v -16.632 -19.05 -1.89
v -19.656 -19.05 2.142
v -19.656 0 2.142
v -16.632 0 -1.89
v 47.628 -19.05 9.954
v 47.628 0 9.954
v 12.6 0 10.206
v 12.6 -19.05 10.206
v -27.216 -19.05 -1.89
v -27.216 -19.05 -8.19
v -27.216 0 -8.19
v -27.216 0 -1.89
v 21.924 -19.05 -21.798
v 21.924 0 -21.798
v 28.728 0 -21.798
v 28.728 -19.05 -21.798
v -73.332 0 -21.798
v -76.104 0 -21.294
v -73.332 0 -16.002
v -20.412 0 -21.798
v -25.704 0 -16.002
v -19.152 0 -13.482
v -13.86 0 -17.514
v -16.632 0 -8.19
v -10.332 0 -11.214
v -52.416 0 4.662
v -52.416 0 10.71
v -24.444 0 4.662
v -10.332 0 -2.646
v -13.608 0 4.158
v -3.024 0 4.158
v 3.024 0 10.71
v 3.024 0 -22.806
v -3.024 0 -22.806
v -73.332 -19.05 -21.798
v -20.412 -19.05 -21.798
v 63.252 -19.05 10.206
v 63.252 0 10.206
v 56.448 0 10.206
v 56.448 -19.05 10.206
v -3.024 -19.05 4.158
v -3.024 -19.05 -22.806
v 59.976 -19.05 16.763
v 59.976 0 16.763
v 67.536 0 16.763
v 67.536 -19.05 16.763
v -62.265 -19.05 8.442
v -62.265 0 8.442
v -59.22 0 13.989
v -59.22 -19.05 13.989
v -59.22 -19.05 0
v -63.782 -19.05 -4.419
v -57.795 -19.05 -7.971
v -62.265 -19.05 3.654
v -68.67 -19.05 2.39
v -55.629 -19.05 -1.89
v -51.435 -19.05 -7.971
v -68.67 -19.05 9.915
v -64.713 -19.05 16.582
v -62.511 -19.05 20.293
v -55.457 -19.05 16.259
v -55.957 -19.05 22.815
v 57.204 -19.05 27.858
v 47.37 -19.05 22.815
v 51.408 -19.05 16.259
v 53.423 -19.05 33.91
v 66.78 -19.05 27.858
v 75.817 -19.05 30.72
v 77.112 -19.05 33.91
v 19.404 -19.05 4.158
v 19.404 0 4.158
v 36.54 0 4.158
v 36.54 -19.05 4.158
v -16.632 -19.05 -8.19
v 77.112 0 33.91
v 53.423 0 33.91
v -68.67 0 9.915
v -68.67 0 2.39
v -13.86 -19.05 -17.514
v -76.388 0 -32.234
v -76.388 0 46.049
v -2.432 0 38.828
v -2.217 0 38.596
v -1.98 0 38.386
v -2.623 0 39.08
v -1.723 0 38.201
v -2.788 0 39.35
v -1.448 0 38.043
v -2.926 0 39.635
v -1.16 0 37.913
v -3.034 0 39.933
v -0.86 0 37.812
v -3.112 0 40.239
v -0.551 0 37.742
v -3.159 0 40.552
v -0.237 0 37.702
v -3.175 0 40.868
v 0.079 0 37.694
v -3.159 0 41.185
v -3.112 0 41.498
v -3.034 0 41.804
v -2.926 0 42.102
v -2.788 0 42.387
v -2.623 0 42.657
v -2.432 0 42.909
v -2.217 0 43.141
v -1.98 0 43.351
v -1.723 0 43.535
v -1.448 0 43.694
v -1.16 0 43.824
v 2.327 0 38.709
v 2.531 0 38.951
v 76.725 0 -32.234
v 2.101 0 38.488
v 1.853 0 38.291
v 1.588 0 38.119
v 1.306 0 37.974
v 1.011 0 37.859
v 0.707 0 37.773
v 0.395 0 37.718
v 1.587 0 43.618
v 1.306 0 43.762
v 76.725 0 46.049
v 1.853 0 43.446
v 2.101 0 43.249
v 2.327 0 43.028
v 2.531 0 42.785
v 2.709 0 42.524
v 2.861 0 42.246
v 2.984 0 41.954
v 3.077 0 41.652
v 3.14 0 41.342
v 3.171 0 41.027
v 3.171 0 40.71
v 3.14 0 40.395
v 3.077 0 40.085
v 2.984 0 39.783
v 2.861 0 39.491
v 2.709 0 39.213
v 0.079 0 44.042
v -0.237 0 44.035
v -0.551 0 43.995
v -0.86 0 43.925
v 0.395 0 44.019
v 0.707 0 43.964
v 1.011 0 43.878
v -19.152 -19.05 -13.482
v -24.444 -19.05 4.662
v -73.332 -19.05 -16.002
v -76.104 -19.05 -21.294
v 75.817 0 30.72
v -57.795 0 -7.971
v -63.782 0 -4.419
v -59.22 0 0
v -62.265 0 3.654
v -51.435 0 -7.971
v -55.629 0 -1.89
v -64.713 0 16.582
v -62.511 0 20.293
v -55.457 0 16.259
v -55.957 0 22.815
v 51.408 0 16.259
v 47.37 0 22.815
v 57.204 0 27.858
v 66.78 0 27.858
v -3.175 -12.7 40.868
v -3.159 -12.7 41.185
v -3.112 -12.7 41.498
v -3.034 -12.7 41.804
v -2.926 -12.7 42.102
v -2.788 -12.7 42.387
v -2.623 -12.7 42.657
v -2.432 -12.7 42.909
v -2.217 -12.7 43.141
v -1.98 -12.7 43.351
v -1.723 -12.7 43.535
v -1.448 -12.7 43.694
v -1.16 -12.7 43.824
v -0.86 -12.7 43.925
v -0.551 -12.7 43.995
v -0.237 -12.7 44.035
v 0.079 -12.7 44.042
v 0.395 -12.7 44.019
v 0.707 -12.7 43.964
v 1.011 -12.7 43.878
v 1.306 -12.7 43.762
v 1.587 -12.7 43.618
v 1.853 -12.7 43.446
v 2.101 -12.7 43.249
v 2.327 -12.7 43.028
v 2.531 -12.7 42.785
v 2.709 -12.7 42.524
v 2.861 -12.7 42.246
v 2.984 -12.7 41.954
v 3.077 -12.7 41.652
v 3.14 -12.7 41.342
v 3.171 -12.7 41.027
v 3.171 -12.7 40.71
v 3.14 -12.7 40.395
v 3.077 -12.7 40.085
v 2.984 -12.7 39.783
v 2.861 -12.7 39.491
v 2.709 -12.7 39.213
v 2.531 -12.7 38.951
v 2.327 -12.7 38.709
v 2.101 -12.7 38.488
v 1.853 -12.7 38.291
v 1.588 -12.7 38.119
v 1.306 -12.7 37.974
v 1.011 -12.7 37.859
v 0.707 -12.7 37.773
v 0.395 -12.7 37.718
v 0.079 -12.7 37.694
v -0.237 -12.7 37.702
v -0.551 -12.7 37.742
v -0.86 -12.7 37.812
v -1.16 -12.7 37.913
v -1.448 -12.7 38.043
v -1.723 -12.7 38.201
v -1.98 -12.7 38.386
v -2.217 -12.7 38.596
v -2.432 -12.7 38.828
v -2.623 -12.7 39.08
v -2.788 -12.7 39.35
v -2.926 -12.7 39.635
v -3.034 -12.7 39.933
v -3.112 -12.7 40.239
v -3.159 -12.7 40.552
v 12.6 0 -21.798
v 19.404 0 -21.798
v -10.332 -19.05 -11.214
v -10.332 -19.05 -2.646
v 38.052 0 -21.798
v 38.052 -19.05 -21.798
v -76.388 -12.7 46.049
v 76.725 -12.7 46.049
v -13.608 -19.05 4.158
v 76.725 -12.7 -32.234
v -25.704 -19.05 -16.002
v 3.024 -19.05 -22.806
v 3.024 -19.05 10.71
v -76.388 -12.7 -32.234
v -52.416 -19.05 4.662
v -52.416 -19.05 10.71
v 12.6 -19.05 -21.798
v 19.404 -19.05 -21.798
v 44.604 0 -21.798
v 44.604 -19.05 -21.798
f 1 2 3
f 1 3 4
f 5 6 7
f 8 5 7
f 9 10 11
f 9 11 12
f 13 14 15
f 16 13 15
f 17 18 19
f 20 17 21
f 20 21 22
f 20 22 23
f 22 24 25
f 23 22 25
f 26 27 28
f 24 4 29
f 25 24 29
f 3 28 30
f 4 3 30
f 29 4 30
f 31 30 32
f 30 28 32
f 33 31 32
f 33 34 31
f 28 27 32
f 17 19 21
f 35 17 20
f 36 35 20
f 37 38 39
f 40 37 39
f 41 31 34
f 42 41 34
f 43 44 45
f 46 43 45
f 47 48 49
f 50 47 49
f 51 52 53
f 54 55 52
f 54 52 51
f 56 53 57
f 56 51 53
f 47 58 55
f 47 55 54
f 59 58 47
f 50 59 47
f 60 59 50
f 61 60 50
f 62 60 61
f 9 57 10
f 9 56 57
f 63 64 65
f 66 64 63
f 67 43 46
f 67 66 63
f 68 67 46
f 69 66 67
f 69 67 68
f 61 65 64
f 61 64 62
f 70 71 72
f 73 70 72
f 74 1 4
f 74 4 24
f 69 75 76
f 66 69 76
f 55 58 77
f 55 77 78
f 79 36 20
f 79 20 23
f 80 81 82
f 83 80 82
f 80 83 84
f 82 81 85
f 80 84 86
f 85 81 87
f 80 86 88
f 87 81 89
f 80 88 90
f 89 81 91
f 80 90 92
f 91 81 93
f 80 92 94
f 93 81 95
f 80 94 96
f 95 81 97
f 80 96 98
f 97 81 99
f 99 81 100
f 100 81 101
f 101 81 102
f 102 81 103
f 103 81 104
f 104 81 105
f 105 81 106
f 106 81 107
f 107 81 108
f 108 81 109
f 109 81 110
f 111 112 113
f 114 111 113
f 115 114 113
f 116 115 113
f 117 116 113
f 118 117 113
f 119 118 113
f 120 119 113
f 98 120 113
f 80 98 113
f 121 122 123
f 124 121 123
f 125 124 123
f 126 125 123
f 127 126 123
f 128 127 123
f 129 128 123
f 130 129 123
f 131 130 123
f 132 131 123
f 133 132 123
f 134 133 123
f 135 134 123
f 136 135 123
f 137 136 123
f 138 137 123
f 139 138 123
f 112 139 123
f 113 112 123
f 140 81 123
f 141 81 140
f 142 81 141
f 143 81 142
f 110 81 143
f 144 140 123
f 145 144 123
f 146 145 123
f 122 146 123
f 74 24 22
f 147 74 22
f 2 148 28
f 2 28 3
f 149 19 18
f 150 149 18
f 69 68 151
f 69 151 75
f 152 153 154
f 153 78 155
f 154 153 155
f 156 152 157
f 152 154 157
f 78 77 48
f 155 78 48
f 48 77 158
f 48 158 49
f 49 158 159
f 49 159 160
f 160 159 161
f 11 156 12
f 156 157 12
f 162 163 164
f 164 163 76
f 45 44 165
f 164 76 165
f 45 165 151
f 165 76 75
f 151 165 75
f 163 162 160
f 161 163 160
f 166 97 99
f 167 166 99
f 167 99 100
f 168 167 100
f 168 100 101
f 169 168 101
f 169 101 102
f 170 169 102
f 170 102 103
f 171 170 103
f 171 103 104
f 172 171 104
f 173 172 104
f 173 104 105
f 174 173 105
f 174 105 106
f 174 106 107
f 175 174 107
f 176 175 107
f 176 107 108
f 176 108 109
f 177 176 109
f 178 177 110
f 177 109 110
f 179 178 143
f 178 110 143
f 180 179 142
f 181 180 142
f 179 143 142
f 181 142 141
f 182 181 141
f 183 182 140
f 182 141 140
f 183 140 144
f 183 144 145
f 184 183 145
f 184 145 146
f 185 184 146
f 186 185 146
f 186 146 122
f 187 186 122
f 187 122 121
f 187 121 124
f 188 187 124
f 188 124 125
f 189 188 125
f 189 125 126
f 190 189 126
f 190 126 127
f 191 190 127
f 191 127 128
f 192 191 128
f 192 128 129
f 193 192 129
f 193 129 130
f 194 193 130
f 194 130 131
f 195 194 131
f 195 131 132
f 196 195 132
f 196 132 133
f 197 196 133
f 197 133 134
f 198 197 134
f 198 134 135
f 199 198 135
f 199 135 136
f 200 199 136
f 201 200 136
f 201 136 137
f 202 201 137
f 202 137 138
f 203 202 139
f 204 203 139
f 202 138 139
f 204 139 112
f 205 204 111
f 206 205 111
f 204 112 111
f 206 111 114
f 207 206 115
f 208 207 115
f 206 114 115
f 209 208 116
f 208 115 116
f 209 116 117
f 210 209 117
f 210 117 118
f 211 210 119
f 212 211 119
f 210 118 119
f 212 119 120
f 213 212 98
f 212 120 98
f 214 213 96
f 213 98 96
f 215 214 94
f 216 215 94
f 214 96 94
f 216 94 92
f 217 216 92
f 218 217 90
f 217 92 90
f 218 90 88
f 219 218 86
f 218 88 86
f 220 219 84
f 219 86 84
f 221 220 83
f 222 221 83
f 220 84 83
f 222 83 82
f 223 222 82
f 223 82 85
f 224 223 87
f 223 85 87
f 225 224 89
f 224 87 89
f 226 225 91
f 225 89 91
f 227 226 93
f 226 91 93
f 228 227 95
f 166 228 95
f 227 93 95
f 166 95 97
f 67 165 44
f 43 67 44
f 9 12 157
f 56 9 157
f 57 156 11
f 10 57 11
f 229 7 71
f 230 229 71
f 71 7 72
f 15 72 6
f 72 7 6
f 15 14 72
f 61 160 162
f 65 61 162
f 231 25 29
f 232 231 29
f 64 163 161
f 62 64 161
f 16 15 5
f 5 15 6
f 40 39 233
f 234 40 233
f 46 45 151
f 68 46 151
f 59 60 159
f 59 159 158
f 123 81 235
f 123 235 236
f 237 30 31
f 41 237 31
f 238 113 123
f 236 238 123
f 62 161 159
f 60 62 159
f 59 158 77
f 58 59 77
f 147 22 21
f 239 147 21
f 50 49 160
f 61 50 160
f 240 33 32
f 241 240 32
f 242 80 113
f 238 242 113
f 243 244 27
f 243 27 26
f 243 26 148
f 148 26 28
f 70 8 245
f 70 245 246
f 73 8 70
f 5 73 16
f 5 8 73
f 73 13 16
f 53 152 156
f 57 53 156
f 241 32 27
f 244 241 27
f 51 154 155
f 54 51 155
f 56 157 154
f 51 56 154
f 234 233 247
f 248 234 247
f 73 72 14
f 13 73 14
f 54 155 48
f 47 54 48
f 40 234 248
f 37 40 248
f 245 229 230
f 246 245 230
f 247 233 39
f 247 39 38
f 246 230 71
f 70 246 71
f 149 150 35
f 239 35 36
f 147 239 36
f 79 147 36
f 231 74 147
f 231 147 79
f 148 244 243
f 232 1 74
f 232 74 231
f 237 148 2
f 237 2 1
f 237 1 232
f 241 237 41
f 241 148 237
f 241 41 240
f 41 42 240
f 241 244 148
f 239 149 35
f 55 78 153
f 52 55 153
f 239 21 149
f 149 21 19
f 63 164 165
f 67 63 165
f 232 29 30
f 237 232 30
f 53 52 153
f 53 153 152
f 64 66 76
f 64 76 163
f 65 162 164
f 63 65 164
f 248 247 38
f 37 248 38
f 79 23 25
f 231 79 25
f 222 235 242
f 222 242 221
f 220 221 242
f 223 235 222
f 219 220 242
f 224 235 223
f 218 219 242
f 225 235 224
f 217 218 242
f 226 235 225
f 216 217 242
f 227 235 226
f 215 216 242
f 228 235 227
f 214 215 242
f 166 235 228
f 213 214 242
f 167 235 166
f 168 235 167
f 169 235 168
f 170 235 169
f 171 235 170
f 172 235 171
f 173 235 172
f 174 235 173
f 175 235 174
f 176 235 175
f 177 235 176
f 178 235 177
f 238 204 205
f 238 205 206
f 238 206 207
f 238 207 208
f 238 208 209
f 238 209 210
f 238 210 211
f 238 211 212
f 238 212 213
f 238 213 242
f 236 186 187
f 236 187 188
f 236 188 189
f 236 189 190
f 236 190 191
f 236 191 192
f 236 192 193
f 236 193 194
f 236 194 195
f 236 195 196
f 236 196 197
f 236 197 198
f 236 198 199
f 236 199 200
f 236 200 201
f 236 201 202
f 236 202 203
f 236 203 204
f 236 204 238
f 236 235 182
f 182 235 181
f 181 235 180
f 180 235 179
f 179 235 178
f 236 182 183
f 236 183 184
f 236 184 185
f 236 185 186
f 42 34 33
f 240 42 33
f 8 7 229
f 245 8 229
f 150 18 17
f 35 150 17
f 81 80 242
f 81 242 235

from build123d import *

# Parameters (mm, degrees)
F1_DEPTH = 19.05
F2_W     = 153.112665
F2_H     = 78.283168
F3_DEPTH = 12.7
F5_D     = 6.35


with BuildPart() as f1:
    # F0 (on Front) → F1 (new body)
    with BuildSketch(Plane.XZ):
        Polygon((63.252002, 10.206), (56.448001, 10.206), (38.052004, -21.798), (44.604003, -21.798), align=None)
        Polygon((47.628, 9.954001), (12.599998, 10.206), (12.599998, -21.798), (19.404003, -21.798), (19.404003, 4.158), (36.539998, 4.158), (21.923998, -21.798), (28.728003, -21.798), align=None)
        Polygon((-51.435247, -7.970991), (-27.216, -8.19), (-27.216, -1.89), (-52.416001, -1.89), (-55.629002, -1.89), (-59.220001, 0), (-62.264539, 3.654), (-62.264539, 8.441675), (-59.220001, 13.989256), (-55.456687, 16.25872), (-51.171839, 16.25872), (51.407997, 16.25872), (57.204001, 27.858207), (66.780001, 27.858207), (59.976004, 16.763045), (67.535996, 16.763045), (75.817332, 30.719556), (77.112004, 33.910114), (53.422719, 33.910114), (47.369506, 22.814952), (-55.95747, 22.814952), (-62.511459, 20.293325), (-64.713446, 16.582323), (-68.669866, 9.91458), (-68.669866, 2.389768), (-63.782178, -4.418626), (-57.795388, -7.970991), align=None)
        Polygon((-73.332004, -16.002001), (-76.104, -21.294001), (-73.332004, -21.798), (-25.200002, -21.798), (-20.412, -21.798), (-13.860001, -17.514), (-10.332, -11.214), (-10.332, -2.646), (-13.608, 4.158), (-3.024, 4.158), (-3.024, -22.806), (3.024, -22.806), (3.024, 10.71), (-52.416001, 10.71), (-52.416001, 4.662), (-24.443999, 4.662), (-19.656001, 2.142), (-16.632, -1.89), (-16.632, -8.19), (-19.151999, -13.482001), (-25.704, -16.002001), align=None)
    extrude(amount=F1_DEPTH)


with BuildPart() as f3:
    # F2 (on Front) → F3 (new body)
    with BuildSketch(Plane.XZ):
        with Locations((0.168196, 6.90734)):
            Rectangle(F2_W, F2_H)
    extrude(amount=F3_DEPTH)

    # F5 (through all)
    with Locations(Plane.XZ.offset(12.7)):
        with Locations((0, 40.868416)):
            Hole(F5_D / 2)


solid = Compound([f1.part, f3.part])
